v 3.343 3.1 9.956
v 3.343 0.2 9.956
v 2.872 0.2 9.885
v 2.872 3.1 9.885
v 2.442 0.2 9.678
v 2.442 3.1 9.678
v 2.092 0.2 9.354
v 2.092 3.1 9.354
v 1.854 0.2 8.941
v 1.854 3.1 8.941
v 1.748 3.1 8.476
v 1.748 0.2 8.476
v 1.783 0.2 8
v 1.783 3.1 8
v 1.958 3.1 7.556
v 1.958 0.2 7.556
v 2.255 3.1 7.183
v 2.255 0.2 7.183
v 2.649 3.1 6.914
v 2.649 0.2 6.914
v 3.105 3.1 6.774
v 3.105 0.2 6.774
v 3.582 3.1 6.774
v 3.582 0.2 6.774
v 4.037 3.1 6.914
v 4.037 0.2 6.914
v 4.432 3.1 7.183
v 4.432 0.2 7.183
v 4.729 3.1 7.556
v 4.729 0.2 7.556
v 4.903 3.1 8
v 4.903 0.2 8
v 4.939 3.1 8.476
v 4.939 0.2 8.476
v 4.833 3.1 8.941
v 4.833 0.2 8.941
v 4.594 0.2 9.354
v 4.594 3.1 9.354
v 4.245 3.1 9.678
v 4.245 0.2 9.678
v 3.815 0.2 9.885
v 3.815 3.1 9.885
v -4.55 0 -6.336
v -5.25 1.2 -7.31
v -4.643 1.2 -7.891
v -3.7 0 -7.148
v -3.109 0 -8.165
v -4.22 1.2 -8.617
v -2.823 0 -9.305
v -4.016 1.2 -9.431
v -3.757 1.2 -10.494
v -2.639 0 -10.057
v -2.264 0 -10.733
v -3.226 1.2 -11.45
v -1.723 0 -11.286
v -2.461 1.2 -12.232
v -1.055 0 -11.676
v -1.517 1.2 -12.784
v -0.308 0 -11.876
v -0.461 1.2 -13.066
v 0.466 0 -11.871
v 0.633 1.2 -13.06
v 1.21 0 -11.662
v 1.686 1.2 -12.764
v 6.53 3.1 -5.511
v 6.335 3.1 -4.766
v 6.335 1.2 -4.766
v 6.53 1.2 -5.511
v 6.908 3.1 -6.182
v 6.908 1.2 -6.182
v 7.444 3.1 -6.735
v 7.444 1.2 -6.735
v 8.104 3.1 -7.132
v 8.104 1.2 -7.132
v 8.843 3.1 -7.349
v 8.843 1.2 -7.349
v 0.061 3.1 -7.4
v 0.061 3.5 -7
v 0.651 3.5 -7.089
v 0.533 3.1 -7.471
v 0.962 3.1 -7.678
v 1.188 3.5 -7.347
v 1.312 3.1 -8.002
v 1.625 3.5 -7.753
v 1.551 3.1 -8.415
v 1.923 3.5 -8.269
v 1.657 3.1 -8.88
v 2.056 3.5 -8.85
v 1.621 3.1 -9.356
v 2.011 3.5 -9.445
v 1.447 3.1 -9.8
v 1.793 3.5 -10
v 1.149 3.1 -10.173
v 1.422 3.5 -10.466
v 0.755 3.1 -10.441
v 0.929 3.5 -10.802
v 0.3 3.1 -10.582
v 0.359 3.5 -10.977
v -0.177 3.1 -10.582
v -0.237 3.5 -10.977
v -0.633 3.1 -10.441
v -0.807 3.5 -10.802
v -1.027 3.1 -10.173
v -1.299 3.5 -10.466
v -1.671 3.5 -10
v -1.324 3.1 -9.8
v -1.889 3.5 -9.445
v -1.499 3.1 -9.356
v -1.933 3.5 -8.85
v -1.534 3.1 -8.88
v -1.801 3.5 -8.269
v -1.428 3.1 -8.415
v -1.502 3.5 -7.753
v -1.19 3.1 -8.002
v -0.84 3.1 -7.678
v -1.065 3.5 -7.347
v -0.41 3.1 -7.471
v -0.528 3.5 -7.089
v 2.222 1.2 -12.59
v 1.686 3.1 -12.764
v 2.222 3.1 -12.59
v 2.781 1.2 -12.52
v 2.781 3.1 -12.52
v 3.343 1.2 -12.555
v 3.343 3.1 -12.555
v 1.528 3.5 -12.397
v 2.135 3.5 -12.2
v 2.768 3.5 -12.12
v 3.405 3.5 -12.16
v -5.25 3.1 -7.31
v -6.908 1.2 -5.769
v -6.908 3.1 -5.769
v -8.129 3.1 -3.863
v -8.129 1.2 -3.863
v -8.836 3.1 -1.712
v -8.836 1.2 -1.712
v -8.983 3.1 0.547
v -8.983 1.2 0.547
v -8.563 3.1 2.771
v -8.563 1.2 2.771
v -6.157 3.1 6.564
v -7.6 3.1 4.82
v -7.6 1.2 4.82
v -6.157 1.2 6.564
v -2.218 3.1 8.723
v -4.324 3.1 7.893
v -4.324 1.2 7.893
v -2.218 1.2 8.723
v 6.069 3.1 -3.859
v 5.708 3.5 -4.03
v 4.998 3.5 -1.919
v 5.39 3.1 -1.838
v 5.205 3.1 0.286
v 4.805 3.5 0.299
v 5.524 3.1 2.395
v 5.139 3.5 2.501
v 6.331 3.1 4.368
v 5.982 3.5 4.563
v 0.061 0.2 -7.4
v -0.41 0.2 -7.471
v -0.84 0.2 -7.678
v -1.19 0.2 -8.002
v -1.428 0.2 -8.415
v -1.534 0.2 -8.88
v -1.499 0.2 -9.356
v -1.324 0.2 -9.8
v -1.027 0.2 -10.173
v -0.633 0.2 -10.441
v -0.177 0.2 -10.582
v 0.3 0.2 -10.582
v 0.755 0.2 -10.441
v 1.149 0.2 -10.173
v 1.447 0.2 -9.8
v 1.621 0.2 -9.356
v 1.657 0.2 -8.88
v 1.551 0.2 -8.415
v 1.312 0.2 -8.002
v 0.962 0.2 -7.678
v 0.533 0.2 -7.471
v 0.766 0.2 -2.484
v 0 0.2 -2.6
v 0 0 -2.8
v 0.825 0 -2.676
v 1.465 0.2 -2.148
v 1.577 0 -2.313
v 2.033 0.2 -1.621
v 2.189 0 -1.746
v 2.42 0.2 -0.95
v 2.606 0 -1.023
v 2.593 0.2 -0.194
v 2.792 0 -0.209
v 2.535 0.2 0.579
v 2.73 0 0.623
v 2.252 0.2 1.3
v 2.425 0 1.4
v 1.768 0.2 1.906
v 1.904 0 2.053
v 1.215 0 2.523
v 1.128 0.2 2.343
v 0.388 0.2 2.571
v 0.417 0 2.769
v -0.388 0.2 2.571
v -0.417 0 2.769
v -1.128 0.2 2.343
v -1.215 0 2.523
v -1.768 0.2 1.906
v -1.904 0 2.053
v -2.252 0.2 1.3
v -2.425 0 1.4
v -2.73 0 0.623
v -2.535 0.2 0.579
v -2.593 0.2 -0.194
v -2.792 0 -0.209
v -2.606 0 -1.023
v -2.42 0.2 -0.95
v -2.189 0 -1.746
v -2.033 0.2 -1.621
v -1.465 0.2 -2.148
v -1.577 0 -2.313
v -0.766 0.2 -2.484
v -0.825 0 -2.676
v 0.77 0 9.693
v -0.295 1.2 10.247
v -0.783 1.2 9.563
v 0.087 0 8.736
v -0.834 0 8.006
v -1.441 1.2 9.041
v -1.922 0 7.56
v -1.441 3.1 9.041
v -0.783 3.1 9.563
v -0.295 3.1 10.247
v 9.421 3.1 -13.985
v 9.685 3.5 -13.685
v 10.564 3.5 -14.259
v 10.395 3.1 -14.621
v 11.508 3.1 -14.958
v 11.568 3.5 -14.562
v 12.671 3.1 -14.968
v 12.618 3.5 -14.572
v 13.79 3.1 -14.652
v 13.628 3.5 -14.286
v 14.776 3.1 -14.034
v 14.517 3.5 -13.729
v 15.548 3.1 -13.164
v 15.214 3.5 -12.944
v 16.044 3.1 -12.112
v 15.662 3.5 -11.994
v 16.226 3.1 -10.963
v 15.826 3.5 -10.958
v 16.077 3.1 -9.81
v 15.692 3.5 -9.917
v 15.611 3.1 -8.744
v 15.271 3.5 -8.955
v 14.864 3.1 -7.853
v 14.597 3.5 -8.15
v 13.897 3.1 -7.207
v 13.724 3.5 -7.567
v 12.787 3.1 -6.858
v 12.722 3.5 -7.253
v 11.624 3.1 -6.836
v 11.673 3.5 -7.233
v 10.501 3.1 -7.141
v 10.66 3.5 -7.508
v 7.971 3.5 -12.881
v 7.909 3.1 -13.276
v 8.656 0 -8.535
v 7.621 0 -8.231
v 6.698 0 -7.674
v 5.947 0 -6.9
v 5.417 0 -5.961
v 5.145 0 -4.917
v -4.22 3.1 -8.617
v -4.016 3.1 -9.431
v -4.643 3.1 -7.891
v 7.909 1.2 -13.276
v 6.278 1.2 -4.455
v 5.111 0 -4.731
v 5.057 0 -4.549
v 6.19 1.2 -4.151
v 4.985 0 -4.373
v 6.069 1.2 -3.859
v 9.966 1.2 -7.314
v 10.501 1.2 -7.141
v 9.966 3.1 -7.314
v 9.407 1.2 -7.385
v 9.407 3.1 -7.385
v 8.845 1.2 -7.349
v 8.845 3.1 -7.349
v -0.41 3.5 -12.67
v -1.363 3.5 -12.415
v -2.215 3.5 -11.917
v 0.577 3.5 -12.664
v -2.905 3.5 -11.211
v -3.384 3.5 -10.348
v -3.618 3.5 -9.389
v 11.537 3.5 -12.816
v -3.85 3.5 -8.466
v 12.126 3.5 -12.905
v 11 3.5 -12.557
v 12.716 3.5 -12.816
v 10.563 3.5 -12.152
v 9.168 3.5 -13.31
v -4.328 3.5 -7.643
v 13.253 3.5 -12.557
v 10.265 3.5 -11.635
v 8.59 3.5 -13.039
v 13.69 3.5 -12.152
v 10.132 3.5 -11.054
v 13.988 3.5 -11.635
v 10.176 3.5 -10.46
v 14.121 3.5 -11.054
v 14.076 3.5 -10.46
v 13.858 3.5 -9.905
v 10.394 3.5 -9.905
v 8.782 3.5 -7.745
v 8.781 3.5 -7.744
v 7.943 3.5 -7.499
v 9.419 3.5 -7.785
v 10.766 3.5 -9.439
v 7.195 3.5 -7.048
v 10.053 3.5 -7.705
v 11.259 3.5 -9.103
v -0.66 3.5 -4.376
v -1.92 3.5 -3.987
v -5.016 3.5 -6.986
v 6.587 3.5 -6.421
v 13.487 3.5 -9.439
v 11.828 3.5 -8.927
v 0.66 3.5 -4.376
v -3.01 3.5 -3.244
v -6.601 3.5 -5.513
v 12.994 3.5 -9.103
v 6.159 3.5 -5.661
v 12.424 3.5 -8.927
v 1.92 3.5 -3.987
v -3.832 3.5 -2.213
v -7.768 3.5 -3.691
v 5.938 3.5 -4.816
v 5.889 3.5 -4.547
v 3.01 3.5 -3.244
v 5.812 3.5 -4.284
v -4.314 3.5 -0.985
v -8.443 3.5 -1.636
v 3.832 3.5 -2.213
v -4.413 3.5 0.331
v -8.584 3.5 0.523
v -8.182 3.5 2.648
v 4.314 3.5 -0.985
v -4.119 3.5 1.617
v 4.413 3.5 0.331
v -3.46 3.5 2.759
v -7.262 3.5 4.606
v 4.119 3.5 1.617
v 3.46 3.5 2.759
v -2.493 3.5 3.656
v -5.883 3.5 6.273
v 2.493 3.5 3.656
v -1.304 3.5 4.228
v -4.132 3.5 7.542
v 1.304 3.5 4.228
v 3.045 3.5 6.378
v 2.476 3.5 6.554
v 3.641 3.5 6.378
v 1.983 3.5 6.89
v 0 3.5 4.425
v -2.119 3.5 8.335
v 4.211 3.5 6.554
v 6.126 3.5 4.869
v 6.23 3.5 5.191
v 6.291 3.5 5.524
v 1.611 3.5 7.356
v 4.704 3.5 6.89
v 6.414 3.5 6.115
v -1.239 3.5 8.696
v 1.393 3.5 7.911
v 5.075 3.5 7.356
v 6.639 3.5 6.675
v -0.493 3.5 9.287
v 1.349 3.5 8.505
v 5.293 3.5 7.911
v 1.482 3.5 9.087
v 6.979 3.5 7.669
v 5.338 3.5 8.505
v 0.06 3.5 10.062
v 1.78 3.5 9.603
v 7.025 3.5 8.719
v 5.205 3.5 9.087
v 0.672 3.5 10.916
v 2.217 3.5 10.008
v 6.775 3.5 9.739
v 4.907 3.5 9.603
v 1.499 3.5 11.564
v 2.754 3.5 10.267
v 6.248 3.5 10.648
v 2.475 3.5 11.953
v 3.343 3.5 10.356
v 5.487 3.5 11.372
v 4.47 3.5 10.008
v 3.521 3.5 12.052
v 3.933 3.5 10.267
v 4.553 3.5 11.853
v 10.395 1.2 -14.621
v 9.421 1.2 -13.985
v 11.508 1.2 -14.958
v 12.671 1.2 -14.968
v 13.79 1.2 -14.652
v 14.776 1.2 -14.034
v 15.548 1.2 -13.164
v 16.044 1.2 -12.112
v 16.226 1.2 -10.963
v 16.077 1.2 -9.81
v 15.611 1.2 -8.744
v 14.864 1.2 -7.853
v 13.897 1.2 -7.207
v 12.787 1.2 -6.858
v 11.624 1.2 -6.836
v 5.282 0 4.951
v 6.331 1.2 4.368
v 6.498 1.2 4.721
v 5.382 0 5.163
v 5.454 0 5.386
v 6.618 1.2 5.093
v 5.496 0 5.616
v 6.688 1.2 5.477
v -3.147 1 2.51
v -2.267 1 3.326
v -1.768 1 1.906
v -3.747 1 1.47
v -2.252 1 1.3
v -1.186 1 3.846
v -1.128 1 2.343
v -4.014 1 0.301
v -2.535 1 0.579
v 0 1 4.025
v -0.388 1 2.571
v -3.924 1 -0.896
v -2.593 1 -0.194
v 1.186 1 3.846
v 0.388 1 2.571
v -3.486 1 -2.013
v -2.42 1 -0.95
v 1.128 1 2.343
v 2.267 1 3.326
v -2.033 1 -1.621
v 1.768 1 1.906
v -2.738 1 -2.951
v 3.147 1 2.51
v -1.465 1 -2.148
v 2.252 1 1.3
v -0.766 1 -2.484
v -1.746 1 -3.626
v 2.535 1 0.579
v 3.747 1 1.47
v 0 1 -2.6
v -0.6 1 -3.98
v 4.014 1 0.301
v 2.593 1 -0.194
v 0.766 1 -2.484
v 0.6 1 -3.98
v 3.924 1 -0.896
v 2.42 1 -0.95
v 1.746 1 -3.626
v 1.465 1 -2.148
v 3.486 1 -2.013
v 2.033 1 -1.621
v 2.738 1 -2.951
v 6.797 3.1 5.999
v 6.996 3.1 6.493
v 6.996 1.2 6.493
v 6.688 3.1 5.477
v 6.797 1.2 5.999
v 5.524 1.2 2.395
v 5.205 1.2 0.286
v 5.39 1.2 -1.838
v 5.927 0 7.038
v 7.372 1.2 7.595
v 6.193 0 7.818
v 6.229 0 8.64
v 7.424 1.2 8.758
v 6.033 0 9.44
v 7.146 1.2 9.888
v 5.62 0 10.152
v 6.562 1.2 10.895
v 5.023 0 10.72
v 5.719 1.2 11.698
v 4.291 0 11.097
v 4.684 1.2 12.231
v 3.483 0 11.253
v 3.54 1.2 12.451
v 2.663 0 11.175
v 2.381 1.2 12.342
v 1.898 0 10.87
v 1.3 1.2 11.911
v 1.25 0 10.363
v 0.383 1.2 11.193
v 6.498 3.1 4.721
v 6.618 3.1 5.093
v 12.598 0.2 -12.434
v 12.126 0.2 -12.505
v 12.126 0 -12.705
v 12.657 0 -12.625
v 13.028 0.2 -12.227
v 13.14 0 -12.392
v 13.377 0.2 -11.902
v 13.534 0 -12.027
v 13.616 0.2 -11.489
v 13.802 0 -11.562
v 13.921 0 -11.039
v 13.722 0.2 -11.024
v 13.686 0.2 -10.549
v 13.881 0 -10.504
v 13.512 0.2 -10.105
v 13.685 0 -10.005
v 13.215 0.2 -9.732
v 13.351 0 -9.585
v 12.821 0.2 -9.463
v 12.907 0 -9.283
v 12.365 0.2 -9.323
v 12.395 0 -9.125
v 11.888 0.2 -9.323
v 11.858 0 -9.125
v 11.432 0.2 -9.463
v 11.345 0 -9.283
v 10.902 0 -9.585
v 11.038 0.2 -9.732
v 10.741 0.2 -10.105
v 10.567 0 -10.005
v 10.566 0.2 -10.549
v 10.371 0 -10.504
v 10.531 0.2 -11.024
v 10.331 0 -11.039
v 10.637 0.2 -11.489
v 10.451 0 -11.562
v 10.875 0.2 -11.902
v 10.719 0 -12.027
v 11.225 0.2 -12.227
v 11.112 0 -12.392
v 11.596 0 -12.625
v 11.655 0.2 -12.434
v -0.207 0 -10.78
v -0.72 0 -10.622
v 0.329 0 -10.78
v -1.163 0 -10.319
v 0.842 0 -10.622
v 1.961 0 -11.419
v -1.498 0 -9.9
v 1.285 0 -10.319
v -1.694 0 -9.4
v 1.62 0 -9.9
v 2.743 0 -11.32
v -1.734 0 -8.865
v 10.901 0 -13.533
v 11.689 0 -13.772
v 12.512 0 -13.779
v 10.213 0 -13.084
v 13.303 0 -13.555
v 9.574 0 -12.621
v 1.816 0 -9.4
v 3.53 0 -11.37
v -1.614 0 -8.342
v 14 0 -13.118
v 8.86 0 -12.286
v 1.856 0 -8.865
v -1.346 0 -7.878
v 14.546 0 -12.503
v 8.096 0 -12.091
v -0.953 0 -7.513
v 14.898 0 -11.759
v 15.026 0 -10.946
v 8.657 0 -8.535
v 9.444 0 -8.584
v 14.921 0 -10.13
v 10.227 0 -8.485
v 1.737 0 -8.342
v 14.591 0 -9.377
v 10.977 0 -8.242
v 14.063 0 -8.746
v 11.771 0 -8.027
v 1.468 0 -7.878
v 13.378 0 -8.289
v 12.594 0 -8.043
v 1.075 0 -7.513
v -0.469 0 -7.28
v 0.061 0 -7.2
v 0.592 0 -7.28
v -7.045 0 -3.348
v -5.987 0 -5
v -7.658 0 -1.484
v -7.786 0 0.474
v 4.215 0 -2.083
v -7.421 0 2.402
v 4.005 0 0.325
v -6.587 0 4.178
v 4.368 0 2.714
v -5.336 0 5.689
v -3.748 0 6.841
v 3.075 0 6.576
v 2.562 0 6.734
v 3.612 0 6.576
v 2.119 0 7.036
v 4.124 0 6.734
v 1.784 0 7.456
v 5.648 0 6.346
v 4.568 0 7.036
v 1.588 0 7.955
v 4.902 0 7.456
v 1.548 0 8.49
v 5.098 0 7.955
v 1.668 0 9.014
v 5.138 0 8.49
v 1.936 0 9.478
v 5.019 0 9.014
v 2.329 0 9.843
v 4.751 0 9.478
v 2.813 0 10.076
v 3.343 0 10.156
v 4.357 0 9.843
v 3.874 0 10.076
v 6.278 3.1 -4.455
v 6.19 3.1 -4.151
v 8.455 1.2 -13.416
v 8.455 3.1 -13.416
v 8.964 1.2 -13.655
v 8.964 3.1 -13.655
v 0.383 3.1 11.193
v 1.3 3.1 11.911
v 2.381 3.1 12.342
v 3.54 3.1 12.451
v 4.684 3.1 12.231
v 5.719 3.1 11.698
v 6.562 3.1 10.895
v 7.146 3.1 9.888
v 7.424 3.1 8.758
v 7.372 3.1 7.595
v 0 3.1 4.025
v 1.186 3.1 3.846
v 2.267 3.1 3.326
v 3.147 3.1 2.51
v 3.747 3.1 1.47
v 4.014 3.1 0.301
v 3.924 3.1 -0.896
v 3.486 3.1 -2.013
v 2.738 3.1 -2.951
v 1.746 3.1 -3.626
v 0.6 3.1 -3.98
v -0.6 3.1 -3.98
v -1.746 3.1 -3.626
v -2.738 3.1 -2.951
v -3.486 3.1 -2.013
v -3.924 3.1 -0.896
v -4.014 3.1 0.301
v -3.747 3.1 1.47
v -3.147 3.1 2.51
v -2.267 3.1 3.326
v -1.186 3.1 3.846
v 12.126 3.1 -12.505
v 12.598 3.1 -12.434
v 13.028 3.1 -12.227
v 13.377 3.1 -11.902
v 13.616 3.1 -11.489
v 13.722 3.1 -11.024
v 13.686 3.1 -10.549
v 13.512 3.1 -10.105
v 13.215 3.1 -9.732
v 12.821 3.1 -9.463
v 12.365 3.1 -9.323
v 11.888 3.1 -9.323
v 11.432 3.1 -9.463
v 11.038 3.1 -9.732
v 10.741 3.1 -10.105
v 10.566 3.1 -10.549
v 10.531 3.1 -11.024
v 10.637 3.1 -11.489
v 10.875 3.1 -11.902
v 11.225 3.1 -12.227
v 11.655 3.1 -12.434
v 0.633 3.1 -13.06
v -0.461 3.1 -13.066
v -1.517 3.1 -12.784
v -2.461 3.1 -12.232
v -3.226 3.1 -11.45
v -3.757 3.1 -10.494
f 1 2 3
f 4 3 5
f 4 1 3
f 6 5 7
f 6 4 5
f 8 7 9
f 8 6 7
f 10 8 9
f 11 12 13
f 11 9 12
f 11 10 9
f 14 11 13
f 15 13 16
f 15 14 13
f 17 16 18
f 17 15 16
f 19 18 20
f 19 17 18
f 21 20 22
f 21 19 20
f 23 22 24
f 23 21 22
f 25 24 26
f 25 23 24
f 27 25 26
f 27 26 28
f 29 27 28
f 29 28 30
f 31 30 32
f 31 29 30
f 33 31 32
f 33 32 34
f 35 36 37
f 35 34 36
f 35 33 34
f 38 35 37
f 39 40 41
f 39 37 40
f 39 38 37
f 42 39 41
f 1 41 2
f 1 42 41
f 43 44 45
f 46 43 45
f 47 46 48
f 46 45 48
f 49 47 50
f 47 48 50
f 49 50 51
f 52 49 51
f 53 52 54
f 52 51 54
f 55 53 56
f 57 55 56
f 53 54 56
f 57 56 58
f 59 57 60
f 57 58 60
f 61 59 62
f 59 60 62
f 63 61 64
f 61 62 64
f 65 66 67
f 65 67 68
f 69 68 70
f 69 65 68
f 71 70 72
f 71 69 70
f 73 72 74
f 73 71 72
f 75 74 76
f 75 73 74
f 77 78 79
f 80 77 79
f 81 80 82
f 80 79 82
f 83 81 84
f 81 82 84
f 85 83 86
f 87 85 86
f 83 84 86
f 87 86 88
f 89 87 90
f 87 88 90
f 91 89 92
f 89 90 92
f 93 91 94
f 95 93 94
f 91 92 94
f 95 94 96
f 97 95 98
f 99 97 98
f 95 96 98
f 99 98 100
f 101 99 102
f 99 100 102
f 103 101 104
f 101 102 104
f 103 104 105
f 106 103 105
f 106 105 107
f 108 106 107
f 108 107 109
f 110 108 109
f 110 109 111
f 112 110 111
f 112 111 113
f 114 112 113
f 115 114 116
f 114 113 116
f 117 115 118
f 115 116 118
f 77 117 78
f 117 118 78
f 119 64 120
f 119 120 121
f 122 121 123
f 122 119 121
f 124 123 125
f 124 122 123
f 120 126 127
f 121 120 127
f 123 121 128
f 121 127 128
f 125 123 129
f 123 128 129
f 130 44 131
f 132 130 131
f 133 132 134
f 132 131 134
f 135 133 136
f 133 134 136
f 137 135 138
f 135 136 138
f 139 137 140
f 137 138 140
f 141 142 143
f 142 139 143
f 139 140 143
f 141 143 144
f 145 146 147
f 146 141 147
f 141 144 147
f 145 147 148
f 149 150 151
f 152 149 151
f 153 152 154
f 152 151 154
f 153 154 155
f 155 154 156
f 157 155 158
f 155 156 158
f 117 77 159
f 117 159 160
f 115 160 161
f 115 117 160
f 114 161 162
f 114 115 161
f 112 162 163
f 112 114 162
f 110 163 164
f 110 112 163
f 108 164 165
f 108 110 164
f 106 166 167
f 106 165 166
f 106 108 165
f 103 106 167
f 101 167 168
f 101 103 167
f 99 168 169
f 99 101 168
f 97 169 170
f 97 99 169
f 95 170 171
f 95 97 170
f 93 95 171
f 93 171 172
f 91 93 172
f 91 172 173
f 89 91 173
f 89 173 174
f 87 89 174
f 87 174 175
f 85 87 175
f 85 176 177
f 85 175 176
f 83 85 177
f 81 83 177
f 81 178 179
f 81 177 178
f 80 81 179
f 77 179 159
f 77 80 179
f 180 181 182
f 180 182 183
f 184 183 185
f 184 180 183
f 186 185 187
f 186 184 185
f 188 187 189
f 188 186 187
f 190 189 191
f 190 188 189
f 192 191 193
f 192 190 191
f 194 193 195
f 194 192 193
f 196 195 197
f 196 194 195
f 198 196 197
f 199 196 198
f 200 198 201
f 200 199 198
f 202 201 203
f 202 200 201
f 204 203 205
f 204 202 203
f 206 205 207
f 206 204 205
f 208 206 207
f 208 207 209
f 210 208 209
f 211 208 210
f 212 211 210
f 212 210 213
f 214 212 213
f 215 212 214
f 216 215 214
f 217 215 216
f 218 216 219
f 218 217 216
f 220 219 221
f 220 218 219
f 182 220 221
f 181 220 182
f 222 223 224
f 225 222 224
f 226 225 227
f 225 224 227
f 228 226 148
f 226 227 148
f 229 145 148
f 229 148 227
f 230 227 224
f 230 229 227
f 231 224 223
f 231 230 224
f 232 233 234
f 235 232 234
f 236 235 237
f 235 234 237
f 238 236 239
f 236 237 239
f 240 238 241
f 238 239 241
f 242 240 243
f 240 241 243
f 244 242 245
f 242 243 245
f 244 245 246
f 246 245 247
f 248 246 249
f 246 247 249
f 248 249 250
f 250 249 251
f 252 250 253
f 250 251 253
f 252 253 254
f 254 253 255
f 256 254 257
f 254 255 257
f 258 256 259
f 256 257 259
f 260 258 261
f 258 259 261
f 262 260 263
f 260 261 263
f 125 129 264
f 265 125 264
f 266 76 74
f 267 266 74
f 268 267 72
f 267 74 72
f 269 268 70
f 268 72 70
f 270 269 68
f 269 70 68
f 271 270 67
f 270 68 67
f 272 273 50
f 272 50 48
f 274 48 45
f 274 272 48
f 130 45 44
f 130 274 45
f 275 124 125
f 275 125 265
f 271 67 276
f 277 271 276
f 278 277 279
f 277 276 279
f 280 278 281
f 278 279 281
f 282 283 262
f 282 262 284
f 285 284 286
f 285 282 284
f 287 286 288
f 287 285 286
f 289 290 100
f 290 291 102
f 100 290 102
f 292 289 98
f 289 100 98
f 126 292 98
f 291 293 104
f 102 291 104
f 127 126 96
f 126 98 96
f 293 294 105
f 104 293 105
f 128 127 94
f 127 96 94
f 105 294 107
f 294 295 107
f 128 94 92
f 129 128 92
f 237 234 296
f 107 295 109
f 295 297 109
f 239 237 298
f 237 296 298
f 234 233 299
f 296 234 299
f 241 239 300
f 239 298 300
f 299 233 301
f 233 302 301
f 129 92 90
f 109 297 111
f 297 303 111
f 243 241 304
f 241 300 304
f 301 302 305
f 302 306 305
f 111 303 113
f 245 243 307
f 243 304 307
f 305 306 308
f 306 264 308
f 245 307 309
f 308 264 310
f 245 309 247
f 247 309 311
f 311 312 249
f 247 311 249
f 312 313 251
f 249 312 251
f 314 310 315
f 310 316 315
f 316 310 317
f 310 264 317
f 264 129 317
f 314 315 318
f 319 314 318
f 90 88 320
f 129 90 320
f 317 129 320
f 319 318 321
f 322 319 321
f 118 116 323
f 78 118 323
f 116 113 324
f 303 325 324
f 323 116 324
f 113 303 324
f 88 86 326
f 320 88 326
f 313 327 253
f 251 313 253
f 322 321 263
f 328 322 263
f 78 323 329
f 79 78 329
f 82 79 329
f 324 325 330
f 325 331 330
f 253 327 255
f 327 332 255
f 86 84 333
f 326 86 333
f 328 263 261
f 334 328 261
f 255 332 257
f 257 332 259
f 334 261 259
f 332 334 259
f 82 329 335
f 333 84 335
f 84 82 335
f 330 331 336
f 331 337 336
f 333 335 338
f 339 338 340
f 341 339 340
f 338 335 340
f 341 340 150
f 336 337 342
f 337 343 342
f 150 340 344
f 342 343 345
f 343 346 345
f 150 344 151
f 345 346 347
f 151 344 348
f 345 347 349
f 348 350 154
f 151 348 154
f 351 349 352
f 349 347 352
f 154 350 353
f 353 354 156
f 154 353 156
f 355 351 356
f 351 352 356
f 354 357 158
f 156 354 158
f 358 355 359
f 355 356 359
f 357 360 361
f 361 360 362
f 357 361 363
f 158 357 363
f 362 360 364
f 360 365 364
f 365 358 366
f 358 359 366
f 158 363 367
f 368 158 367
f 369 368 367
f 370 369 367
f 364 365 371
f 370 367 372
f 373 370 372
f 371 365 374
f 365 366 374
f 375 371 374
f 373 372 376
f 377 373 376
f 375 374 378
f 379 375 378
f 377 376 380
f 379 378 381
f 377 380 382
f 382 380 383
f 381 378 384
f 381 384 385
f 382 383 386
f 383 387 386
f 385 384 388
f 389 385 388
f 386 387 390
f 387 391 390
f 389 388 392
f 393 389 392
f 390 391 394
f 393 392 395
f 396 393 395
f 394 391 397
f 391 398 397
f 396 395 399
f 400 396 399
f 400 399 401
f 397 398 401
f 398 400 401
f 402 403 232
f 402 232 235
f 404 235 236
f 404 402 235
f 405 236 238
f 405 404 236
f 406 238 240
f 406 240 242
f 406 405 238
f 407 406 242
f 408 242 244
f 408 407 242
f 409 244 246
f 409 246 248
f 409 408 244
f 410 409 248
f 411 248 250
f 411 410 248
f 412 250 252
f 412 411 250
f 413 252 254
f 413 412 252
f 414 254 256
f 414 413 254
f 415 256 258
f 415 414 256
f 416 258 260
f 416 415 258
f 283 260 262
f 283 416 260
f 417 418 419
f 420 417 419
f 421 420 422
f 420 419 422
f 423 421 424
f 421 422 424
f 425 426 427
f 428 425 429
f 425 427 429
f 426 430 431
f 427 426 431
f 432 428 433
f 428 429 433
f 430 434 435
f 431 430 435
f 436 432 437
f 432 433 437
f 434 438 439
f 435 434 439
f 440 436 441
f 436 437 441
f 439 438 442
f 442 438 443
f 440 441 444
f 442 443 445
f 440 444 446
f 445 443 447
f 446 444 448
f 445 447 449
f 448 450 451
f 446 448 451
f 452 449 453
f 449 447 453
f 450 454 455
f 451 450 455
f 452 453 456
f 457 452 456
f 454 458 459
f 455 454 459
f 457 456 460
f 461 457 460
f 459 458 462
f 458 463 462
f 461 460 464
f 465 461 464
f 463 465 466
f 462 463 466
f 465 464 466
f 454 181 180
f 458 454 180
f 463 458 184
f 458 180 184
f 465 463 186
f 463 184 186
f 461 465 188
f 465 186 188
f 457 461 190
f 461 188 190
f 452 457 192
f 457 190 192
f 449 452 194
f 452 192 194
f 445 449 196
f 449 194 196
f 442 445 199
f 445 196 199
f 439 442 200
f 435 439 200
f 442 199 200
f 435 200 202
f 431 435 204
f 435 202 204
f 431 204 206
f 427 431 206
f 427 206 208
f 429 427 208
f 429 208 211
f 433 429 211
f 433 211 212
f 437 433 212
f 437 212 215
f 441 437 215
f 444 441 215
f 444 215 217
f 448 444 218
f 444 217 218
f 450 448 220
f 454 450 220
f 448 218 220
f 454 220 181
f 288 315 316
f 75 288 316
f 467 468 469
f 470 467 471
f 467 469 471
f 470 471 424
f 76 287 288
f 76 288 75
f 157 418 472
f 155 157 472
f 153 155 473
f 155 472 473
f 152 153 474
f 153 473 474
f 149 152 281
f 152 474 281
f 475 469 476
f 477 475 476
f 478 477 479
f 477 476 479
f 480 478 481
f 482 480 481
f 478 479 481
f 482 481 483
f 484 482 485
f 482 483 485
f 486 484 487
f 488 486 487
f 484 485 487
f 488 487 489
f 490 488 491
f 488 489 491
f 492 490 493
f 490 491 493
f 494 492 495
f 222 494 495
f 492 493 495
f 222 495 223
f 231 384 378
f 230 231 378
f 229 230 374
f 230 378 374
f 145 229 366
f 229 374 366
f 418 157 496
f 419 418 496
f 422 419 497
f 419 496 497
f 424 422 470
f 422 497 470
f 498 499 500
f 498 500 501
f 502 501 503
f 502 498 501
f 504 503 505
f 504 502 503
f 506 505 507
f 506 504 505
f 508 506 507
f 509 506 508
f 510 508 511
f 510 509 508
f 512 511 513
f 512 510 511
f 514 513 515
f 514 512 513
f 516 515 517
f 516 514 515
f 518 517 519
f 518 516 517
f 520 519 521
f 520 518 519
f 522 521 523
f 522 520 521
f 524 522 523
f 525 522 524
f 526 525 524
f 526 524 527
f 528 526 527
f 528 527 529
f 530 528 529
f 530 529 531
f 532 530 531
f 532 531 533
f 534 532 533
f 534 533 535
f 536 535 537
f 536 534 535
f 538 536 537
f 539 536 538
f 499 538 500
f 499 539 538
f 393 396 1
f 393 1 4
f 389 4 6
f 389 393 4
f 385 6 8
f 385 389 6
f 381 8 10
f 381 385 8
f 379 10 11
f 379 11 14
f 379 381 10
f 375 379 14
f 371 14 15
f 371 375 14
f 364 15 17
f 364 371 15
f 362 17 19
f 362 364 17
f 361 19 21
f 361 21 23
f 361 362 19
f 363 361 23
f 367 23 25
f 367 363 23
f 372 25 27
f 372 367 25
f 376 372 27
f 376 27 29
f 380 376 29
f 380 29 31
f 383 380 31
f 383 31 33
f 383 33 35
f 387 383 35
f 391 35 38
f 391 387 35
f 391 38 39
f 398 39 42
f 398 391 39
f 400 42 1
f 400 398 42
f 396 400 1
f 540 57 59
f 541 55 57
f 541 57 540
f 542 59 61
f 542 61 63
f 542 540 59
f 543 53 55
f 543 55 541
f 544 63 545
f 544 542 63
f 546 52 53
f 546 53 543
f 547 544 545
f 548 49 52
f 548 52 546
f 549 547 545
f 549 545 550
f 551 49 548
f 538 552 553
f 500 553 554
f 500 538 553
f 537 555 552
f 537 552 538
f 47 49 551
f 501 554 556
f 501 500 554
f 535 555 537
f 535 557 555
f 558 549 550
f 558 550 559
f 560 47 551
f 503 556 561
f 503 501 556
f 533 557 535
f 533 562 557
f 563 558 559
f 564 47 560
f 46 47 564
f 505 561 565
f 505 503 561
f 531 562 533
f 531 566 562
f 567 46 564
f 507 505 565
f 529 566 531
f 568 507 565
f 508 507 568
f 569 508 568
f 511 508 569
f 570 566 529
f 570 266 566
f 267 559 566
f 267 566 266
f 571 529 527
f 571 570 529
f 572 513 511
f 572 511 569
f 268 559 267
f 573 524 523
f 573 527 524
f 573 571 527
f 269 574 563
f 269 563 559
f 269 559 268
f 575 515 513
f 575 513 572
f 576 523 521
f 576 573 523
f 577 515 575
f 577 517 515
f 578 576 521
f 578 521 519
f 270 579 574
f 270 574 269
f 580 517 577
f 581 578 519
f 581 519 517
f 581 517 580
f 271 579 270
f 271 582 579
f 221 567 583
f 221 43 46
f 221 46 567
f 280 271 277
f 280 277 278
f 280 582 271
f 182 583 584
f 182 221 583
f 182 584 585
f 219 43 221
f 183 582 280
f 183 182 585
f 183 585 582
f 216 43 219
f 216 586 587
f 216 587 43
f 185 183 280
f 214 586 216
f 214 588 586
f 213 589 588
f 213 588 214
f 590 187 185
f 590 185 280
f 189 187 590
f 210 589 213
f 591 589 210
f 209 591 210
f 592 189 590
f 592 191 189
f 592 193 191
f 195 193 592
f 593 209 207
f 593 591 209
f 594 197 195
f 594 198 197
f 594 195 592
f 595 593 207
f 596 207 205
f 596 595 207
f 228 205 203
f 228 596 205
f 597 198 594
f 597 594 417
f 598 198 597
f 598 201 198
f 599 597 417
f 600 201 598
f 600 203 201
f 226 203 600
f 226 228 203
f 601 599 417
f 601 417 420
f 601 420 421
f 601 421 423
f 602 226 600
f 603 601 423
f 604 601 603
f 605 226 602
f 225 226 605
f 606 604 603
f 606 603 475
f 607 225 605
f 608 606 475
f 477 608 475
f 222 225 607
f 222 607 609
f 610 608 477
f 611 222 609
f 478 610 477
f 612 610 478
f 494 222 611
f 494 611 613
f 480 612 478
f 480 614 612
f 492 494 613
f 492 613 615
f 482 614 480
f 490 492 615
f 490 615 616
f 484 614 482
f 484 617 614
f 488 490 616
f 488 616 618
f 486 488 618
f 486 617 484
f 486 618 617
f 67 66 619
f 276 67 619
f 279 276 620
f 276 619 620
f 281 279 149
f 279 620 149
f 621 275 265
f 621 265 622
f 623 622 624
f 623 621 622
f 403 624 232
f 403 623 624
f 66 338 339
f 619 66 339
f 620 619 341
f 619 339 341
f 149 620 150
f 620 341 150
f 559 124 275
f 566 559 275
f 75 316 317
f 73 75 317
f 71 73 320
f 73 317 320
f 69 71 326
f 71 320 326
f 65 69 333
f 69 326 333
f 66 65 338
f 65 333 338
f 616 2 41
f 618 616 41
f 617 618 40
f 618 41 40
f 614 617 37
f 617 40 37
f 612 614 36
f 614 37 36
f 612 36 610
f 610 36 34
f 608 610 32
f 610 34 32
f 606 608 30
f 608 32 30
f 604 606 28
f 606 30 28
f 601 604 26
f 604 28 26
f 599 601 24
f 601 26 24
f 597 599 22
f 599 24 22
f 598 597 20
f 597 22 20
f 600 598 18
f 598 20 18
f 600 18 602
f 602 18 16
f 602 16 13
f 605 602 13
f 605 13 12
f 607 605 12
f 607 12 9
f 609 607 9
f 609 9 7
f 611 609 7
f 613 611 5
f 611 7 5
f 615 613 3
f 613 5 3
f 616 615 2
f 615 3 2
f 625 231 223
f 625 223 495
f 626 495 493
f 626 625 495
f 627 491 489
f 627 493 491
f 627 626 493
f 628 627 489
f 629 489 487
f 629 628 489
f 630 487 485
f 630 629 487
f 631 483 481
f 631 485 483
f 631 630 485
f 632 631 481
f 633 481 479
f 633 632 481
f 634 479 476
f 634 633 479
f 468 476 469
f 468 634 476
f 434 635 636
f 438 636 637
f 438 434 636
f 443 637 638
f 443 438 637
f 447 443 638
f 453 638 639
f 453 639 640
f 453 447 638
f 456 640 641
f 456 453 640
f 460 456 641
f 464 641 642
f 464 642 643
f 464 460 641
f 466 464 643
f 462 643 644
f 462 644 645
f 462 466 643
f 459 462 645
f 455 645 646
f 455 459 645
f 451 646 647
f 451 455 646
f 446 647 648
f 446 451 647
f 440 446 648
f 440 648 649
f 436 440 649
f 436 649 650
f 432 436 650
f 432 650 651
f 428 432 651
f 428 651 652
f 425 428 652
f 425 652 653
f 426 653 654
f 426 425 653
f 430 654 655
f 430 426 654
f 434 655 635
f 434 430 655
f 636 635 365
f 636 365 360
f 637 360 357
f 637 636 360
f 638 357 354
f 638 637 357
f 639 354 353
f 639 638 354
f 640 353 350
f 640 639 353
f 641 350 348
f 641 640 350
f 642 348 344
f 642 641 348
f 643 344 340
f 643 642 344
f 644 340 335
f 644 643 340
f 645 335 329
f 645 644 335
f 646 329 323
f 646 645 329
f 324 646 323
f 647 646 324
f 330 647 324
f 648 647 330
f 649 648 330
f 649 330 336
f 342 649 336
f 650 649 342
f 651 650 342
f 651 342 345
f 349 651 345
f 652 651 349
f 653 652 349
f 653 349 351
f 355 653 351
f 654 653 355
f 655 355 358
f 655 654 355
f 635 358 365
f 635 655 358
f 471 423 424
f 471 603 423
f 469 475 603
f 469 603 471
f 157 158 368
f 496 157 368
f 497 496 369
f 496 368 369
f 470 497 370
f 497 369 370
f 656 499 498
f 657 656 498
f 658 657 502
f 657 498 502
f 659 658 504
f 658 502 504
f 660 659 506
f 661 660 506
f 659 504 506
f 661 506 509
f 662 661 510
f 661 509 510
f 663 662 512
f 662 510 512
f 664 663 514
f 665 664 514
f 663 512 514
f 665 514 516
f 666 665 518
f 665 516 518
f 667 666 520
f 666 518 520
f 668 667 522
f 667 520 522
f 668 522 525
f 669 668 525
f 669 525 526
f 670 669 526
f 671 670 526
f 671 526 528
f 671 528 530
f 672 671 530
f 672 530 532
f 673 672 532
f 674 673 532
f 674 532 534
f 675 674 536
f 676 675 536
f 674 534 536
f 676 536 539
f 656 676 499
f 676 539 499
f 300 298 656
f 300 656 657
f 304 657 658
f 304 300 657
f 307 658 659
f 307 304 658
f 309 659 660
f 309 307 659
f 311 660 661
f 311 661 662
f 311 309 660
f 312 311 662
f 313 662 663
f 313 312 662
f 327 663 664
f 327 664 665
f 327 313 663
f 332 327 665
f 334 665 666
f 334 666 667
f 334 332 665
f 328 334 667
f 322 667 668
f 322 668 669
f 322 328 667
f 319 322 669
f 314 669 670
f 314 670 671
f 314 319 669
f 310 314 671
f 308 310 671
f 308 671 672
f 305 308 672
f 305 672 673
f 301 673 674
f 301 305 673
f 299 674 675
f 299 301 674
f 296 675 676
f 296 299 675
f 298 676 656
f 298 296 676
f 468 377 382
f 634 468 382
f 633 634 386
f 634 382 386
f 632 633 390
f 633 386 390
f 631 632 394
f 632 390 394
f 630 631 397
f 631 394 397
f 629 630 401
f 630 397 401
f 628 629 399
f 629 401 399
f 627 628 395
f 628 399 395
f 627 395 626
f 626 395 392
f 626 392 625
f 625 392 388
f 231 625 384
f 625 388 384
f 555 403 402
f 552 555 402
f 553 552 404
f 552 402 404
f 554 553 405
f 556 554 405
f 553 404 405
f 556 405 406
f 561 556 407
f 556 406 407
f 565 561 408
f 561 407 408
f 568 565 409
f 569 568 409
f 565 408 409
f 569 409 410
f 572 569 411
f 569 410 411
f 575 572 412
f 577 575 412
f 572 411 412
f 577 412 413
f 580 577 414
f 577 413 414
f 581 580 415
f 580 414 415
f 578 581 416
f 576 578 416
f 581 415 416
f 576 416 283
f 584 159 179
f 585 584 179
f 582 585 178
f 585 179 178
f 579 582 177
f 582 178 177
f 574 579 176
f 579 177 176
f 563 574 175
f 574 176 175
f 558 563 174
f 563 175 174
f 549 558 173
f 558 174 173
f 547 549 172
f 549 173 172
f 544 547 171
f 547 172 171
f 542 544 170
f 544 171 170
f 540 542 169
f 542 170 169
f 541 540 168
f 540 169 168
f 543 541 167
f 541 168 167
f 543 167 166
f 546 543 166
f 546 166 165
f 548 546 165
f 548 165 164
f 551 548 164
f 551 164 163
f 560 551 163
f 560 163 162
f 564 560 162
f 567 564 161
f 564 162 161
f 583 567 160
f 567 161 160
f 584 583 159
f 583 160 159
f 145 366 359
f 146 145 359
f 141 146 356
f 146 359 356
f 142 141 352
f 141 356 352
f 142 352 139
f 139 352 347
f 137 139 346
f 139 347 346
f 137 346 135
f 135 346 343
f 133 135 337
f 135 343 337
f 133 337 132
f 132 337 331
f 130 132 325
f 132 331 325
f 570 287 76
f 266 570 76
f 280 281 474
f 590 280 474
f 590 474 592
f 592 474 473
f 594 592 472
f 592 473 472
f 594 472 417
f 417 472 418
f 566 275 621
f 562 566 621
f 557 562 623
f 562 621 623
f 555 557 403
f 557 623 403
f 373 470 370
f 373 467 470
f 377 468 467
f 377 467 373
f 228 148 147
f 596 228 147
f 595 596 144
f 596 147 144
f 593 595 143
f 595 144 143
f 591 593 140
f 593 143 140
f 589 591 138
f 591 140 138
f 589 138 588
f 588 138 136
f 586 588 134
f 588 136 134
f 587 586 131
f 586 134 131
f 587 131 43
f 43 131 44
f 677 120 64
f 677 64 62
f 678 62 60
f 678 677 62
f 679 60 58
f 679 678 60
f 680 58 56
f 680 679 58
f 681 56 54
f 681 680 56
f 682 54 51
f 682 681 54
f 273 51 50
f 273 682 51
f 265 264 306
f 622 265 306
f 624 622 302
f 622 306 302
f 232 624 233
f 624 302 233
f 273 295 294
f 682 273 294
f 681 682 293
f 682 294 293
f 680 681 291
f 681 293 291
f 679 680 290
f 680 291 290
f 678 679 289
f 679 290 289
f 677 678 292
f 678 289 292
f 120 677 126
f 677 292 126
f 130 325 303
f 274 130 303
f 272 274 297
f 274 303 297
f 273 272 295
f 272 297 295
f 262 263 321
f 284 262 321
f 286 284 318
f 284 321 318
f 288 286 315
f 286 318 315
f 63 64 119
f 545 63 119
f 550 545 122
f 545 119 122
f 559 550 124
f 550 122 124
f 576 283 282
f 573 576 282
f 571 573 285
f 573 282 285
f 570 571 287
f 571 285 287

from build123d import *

# Parameters (mm, degrees)
SKETCH1_R           = 9
SKETCH1_R_2         = 4.025
BOSS_EXTRUDE1_DEPTH = 3.5
SKETCH2_R           = 4.1
SKETCH2_R_2         = 1.6
BOSS_EXTRUDE2_DEPTH = 3.5
SKETCH6_R           = 9
CUT_EXTRUDE2_DEPTH  = 17.27435259
CUT_EXTRUDE1_START  = -3.5
SKETCH3_R           = 1.6
CUT_EXTRUDE1_DEPTH  = 3.5
SKETCH4_R           = 1.6
BOSS_EXTRUDE3_DEPTH = 3.5
SKETCH5_R           = 4.025
SKETCH5_R_2         = 2.6
BOSS_EXTRUDE4_DEPTH = 1
FILLET1_R           = 3
FILLET9_R           = 3
CHAMFER_1_SIZE      = 1.2
CHAMFER_2_SIZE      = 0.2
CHAMFER_3_SIZE      = 0.4


with BuildPart() as part:
    # Sketch1 → Boss-Extrude1 (new body)
    with BuildSketch(Plane(origin=(0, 0, 0), x_dir=(1, 0, 0), z_dir=(0, 1, 0))):
        with Locations(Location((0, 0, 0), (0, 0, 270))):
            Circle(SKETCH1_R)
        with Locations(Location((0, 0, 0), (0, 0, 270))):
            Circle(SKETCH1_R_2, mode=Mode.SUBTRACT)
    extrude(amount=BOSS_EXTRUDE1_DEPTH)

    # Sketch2 → Boss-Extrude2 (add)
    # profile 1 of 2: a face of its own
    with BuildSketch(Plane(origin=(0, 3.5, 0), x_dir=(1, 0, 0), z_dir=(0, 1, 0))):
        with Locations((3.343277014, -8.355985807)):
            Circle(SKETCH2_R)
        with Locations((3.343277014, -8.355985807)):
            Circle(SKETCH2_R_2, mode=Mode.SUBTRACT)
    # profile 2 of 2: a face of its own
    with BuildSketch(Plane(origin=(0, 3.5, 0), x_dir=(1, 0, 0), z_dir=(0, 1, 0))):
        with Locations((0.061177946, 8.999792068)):
            Circle(SKETCH2_R)
        with Locations((0.061177946, 8.999792068)):
            Circle(SKETCH2_R_2, mode=Mode.SUBTRACT)
    extrude(amount=-BOSS_EXTRUDE2_DEPTH)

    # Sketch6 → Cut-Extrude2 (cut, through all)
    with BuildSketch(Plane(origin=(0, 0, 0), x_dir=(-1, 0, 0), z_dir=(0, -1, 0))):
        with Locations((-14.2, 0)):
            Circle(SKETCH6_R)
    extrude(amount=-CUT_EXTRUDE2_DEPTH, mode=Mode.SUBTRACT)

    # Sketch3 → Cut-Extrude1 (cut)
    with BuildSketch(Plane(origin=(0, 0, 0), x_dir=(-1, 0, 0), z_dir=(0, -1, 0)).offset(CUT_EXTRUDE1_START)):
        with Locations(Location((-0.061177946, 8.999792068, 0), (0, 0, 270))):
            Circle(SKETCH3_R)
        with Locations(Location((-3.343277014, -8.355985807, 0), (0, 0, 270))):
            Circle(SKETCH3_R)
    extrude(amount=CUT_EXTRUDE1_DEPTH, mode=Mode.SUBTRACT)

    # Sketch4 → Boss-Extrude3 (add)
    with BuildSketch(Plane(origin=(0, 0, 0), x_dir=(-1, 0, 0), z_dir=(0, -1, 0))):
        with BuildLine():
            Line((-2.353733001, 12.398937743), (-8.897987933, 13.432234974))
            ThreePointArc((-8.897987933, 13.432234974), (-16.176141716, 11.544244815), (-9.833757914, 7.505656319))
            Line((-9.833757914, 7.505656319), (-5.813078926, 6.870816065))
            ThreePointArc((-5.813078926, 6.870816065), (-4.964487715, 7.506920922), (-4.04696144, 8.038787415))
            ThreePointArc((-4.04696144, 8.038787415), (-3.883103044, 10.484005175), (-2.353733001, 12.398937743))
        make_face()
        with Locations(Location((-12.126312969, 10.904801994, 0), (0, 0, 90))):
            Circle(SKETCH4_R, mode=Mode.SUBTRACT)
    extrude(amount=-BOSS_EXTRUDE3_DEPTH)

    # Sketch5 → Boss-Extrude4 (add)
    with BuildSketch(Plane(origin=(0, 0, 0), x_dir=(-1, 0, 0), z_dir=(0, -1, 0))):
        with Locations(Location((0, 0, 0), (0, 0, 90))):
            Circle(SKETCH5_R)
        with Locations(Location((0, 0, 0), (0, 0, 90))):
            Circle(SKETCH5_R_2, mode=Mode.SUBTRACT)
    extrude(amount=-BOSS_EXTRUDE4_DEPTH)

    # Fillet1
    # the kernel refuses this fillet: 3 mm, written as the material it adds along each edge
    with BuildSketch(Plane(origin=(-0.71019136, 3.5, 8.97193559), x_dir=(-0.9865858542334134, 0, -0.1632432302624714), z_dir=(0, -1, 0))) as fillet1_piece_1:
        with BuildLine():
            CenterArc((1.782533661, -2.98917289), FILLET1_R, 94.869271374, 48.27534012)
            ThreePointArc((-0.617922081, -1.189780705), (-0.260000299, -0.620318503), (0, 0))
            ThreePointArc((0, 0), (0.763942997, -0.03248133), (1.527885995, 0))
        make_face()
    extrude(amount=3.5)
    with BuildSketch(Plane(origin=(-3.93730186, 3.5, -8.093062095), x_dir=(-0.8588495215516518, 0, 0.5122279759350309), z_dir=(0, -1, 0))) as fillet1_piece_2:
        with BuildLine():
            CenterArc((1.782533661, 2.98917289), FILLET1_R, 216.855388506, 48.27534012)
            ThreePointArc((-0.617922081, 1.189780705), (-0.260000299, 0.620318503), (0, 0))
            ThreePointArc((0, 0), (0.763942997, 0.03248133), (1.527885995, 0))
        make_face()
    extrude(amount=3.5)
    with BuildSketch(Plane(origin=(8.897987933, 0, -13.432234974), x_dir=(-0.9877631090139599, 0, 0.15596166346598195), z_dir=(0, 1, 0))) as fillet1_piece_3:
        with BuildLine():
            CenterArc((1.001412857, -3), FILLET1_R, 90, 32.320518146)
            ThreePointArc((-0.602552177, -0.464788732), (-0.290469322, -0.24640426), (0, 0))
            Line((0, 0), (1.001412857, 0))
        make_face()
    extrude(amount=3.5)
    with BuildSketch(Plane(origin=(2.353733001, 0, -12.398937743), x_dir=(-0.8773738132879287, 0, -0.4798074527939294), z_dir=(0, 1, 0)), Plane(origin=(9.833757914, 0, -7.505656319), x_dir=(0.8773738132879222, 0, 0.47980745279394127), z_dir=(0, 1, 0))) as fillet1_piece_4:
        with BuildLine():
            CenterArc((1.039393717, -2.987053466), FILLET1_R, 95.324882893, 32.320518146)
            Line((-0.792924625, -0.611635715), (0, 0))
            ThreePointArc((0, 0), (0.380492343, -0.017693596), (0.760984685, 0))
        make_face()
    extrude(amount=3.5)
    # the kernel refuses this fillet: 3 mm, written as the material it takes off along each edge
    with BuildSketch(Plane(origin=(7.1, 6.983871428, 5.530822724), x_dir=(-0.6413091964506672, 0, 0.7672825519636162), z_dir=(0, -1, 0))) as fillet1_2_piece_1:
        with BuildLine():
            CenterArc((2.400494629, 2.413903277), FILLET1_R, 201.072777054, 32.502187501)
            ThreePointArc((-0.398878795, 1.335242797), (-0.173557144, 0.675353237), (0, 0))
            ThreePointArc((0, 0), (0.309591521, -0.005326404), (0.619183042, 0))
        make_face()
    extrude(amount=10.467742856, mode=Mode.SUBTRACT)
    with BuildSketch(Plane(origin=(7.1, 8.410224582, -5.530822724), x_dir=(-0.5247859915025788, 0, 0.8512341999254115), z_dir=(0, -1, 0))) as fillet1_2_piece_2:
        with BuildLine():
            CenterArc((2.291438138, 2.982087035), FILLET1_R, 203.232841743, 60.502793026)
            ThreePointArc((-0.465290008, 1.798680965), (-0.279182448, 0.88730199), (0, 0))
            ThreePointArc((0, 0), (0.982044916, 0.053738894), (1.964089833, 0))
        make_face()
    extrude(amount=13.320449164, mode=Mode.SUBTRACT)

    # Fillet9
    fillet9_edges = [part.edges().sort_by_distance(p)[0] for p in [
        (6.702912221, 1.75, 6.005911068),
        (5.813078926, 1.75, -6.870816065),
    ]]
    fillet(fillet9_edges, radius=FILLET9_R)

    # 倒角1
    chamfer_1_edges = [part.edges().sort_by_distance(p)[0] for p in [
        (16.176141716, 0, -11.544244815),
        (5.625860467, 0, -12.915586358),
        (-2.007663811, 0, -12.539551069),
        (5.204560758, 0, 0.286483569),
        (5.220072831, 0, 12.001206989),
        (-8.84326494, 0, 1.672323294),
        (6.564091926, 0, 4.905386326),
        (9.687844205, 0, -7.362609827),
        (8.715099113, 0, -13.523365587),
        (2.49964671, 0, -12.541984235),
        (-4.406035705, 0, -8.239061366),
        (-1.093245074, 0, 9.27901385),
        (8.843752485, 0, -7.349340608),
        (6.238006504, 0, -4.301725459),
        (7.158194759, 0, -6.475494242),
        (6.796639749, 0, 5.998875214),
    ]]
    chamfer(chamfer_1_edges, length=CHAMFER_1_SIZE)

    # 倒角2
    chamfer_2_edges = [part.edges().sort_by_distance(p)[0] for p in [
        (4.706817353, 0, 9.19309855),
        (1.13707684, 0, -7.815544808),
        (12.126312969, 0, -9.304801994),
        (0, 0, 2.6),
    ]]
    chamfer(chamfer_2_edges, length=CHAMFER_2_SIZE)

    # 倒角3
    chamfer_3_edges = [part.edges().sort_by_distance(p)[0] for p in [
        (16.176141716, 3.5, -11.544244815),
        (5.625860467, 3.5, -12.915586358),
        (-2.007663811, 3.5, -12.539551069),
        (5.204560758, 3.5, 0.286483569),
        (-8.84326494, 3.5, 1.672323294),
        (5.220072831, 3.5, 12.001206989),
        (6.238006504, 3.5, -4.301725459),
        (9.687844205, 3.5, -7.362609827),
        (8.715099113, 3.5, -13.523365587),
        (2.49964671, 3.5, -12.541984235),
        (-4.406035705, 3.5, -8.239061366),
        (-1.093245074, 3.5, 9.27901385),
        (8.843752485, 3.5, -7.349340608),
        (6.564091926, 3.5, 4.905386326),
        (7.158194759, 3.5, -6.475494242),
        (6.796639749, 3.5, 5.998875214),
        (4.706817353, 3.5, 9.19309855),
        (1.13707684, 3.5, -7.815544808),
        (0, 3.5, -4.025),
        (12.126312969, 3.5, -9.304801994),
    ]]
    chamfer(chamfer_3_edges, length=CHAMFER_3_SIZE)


solid = part.part
